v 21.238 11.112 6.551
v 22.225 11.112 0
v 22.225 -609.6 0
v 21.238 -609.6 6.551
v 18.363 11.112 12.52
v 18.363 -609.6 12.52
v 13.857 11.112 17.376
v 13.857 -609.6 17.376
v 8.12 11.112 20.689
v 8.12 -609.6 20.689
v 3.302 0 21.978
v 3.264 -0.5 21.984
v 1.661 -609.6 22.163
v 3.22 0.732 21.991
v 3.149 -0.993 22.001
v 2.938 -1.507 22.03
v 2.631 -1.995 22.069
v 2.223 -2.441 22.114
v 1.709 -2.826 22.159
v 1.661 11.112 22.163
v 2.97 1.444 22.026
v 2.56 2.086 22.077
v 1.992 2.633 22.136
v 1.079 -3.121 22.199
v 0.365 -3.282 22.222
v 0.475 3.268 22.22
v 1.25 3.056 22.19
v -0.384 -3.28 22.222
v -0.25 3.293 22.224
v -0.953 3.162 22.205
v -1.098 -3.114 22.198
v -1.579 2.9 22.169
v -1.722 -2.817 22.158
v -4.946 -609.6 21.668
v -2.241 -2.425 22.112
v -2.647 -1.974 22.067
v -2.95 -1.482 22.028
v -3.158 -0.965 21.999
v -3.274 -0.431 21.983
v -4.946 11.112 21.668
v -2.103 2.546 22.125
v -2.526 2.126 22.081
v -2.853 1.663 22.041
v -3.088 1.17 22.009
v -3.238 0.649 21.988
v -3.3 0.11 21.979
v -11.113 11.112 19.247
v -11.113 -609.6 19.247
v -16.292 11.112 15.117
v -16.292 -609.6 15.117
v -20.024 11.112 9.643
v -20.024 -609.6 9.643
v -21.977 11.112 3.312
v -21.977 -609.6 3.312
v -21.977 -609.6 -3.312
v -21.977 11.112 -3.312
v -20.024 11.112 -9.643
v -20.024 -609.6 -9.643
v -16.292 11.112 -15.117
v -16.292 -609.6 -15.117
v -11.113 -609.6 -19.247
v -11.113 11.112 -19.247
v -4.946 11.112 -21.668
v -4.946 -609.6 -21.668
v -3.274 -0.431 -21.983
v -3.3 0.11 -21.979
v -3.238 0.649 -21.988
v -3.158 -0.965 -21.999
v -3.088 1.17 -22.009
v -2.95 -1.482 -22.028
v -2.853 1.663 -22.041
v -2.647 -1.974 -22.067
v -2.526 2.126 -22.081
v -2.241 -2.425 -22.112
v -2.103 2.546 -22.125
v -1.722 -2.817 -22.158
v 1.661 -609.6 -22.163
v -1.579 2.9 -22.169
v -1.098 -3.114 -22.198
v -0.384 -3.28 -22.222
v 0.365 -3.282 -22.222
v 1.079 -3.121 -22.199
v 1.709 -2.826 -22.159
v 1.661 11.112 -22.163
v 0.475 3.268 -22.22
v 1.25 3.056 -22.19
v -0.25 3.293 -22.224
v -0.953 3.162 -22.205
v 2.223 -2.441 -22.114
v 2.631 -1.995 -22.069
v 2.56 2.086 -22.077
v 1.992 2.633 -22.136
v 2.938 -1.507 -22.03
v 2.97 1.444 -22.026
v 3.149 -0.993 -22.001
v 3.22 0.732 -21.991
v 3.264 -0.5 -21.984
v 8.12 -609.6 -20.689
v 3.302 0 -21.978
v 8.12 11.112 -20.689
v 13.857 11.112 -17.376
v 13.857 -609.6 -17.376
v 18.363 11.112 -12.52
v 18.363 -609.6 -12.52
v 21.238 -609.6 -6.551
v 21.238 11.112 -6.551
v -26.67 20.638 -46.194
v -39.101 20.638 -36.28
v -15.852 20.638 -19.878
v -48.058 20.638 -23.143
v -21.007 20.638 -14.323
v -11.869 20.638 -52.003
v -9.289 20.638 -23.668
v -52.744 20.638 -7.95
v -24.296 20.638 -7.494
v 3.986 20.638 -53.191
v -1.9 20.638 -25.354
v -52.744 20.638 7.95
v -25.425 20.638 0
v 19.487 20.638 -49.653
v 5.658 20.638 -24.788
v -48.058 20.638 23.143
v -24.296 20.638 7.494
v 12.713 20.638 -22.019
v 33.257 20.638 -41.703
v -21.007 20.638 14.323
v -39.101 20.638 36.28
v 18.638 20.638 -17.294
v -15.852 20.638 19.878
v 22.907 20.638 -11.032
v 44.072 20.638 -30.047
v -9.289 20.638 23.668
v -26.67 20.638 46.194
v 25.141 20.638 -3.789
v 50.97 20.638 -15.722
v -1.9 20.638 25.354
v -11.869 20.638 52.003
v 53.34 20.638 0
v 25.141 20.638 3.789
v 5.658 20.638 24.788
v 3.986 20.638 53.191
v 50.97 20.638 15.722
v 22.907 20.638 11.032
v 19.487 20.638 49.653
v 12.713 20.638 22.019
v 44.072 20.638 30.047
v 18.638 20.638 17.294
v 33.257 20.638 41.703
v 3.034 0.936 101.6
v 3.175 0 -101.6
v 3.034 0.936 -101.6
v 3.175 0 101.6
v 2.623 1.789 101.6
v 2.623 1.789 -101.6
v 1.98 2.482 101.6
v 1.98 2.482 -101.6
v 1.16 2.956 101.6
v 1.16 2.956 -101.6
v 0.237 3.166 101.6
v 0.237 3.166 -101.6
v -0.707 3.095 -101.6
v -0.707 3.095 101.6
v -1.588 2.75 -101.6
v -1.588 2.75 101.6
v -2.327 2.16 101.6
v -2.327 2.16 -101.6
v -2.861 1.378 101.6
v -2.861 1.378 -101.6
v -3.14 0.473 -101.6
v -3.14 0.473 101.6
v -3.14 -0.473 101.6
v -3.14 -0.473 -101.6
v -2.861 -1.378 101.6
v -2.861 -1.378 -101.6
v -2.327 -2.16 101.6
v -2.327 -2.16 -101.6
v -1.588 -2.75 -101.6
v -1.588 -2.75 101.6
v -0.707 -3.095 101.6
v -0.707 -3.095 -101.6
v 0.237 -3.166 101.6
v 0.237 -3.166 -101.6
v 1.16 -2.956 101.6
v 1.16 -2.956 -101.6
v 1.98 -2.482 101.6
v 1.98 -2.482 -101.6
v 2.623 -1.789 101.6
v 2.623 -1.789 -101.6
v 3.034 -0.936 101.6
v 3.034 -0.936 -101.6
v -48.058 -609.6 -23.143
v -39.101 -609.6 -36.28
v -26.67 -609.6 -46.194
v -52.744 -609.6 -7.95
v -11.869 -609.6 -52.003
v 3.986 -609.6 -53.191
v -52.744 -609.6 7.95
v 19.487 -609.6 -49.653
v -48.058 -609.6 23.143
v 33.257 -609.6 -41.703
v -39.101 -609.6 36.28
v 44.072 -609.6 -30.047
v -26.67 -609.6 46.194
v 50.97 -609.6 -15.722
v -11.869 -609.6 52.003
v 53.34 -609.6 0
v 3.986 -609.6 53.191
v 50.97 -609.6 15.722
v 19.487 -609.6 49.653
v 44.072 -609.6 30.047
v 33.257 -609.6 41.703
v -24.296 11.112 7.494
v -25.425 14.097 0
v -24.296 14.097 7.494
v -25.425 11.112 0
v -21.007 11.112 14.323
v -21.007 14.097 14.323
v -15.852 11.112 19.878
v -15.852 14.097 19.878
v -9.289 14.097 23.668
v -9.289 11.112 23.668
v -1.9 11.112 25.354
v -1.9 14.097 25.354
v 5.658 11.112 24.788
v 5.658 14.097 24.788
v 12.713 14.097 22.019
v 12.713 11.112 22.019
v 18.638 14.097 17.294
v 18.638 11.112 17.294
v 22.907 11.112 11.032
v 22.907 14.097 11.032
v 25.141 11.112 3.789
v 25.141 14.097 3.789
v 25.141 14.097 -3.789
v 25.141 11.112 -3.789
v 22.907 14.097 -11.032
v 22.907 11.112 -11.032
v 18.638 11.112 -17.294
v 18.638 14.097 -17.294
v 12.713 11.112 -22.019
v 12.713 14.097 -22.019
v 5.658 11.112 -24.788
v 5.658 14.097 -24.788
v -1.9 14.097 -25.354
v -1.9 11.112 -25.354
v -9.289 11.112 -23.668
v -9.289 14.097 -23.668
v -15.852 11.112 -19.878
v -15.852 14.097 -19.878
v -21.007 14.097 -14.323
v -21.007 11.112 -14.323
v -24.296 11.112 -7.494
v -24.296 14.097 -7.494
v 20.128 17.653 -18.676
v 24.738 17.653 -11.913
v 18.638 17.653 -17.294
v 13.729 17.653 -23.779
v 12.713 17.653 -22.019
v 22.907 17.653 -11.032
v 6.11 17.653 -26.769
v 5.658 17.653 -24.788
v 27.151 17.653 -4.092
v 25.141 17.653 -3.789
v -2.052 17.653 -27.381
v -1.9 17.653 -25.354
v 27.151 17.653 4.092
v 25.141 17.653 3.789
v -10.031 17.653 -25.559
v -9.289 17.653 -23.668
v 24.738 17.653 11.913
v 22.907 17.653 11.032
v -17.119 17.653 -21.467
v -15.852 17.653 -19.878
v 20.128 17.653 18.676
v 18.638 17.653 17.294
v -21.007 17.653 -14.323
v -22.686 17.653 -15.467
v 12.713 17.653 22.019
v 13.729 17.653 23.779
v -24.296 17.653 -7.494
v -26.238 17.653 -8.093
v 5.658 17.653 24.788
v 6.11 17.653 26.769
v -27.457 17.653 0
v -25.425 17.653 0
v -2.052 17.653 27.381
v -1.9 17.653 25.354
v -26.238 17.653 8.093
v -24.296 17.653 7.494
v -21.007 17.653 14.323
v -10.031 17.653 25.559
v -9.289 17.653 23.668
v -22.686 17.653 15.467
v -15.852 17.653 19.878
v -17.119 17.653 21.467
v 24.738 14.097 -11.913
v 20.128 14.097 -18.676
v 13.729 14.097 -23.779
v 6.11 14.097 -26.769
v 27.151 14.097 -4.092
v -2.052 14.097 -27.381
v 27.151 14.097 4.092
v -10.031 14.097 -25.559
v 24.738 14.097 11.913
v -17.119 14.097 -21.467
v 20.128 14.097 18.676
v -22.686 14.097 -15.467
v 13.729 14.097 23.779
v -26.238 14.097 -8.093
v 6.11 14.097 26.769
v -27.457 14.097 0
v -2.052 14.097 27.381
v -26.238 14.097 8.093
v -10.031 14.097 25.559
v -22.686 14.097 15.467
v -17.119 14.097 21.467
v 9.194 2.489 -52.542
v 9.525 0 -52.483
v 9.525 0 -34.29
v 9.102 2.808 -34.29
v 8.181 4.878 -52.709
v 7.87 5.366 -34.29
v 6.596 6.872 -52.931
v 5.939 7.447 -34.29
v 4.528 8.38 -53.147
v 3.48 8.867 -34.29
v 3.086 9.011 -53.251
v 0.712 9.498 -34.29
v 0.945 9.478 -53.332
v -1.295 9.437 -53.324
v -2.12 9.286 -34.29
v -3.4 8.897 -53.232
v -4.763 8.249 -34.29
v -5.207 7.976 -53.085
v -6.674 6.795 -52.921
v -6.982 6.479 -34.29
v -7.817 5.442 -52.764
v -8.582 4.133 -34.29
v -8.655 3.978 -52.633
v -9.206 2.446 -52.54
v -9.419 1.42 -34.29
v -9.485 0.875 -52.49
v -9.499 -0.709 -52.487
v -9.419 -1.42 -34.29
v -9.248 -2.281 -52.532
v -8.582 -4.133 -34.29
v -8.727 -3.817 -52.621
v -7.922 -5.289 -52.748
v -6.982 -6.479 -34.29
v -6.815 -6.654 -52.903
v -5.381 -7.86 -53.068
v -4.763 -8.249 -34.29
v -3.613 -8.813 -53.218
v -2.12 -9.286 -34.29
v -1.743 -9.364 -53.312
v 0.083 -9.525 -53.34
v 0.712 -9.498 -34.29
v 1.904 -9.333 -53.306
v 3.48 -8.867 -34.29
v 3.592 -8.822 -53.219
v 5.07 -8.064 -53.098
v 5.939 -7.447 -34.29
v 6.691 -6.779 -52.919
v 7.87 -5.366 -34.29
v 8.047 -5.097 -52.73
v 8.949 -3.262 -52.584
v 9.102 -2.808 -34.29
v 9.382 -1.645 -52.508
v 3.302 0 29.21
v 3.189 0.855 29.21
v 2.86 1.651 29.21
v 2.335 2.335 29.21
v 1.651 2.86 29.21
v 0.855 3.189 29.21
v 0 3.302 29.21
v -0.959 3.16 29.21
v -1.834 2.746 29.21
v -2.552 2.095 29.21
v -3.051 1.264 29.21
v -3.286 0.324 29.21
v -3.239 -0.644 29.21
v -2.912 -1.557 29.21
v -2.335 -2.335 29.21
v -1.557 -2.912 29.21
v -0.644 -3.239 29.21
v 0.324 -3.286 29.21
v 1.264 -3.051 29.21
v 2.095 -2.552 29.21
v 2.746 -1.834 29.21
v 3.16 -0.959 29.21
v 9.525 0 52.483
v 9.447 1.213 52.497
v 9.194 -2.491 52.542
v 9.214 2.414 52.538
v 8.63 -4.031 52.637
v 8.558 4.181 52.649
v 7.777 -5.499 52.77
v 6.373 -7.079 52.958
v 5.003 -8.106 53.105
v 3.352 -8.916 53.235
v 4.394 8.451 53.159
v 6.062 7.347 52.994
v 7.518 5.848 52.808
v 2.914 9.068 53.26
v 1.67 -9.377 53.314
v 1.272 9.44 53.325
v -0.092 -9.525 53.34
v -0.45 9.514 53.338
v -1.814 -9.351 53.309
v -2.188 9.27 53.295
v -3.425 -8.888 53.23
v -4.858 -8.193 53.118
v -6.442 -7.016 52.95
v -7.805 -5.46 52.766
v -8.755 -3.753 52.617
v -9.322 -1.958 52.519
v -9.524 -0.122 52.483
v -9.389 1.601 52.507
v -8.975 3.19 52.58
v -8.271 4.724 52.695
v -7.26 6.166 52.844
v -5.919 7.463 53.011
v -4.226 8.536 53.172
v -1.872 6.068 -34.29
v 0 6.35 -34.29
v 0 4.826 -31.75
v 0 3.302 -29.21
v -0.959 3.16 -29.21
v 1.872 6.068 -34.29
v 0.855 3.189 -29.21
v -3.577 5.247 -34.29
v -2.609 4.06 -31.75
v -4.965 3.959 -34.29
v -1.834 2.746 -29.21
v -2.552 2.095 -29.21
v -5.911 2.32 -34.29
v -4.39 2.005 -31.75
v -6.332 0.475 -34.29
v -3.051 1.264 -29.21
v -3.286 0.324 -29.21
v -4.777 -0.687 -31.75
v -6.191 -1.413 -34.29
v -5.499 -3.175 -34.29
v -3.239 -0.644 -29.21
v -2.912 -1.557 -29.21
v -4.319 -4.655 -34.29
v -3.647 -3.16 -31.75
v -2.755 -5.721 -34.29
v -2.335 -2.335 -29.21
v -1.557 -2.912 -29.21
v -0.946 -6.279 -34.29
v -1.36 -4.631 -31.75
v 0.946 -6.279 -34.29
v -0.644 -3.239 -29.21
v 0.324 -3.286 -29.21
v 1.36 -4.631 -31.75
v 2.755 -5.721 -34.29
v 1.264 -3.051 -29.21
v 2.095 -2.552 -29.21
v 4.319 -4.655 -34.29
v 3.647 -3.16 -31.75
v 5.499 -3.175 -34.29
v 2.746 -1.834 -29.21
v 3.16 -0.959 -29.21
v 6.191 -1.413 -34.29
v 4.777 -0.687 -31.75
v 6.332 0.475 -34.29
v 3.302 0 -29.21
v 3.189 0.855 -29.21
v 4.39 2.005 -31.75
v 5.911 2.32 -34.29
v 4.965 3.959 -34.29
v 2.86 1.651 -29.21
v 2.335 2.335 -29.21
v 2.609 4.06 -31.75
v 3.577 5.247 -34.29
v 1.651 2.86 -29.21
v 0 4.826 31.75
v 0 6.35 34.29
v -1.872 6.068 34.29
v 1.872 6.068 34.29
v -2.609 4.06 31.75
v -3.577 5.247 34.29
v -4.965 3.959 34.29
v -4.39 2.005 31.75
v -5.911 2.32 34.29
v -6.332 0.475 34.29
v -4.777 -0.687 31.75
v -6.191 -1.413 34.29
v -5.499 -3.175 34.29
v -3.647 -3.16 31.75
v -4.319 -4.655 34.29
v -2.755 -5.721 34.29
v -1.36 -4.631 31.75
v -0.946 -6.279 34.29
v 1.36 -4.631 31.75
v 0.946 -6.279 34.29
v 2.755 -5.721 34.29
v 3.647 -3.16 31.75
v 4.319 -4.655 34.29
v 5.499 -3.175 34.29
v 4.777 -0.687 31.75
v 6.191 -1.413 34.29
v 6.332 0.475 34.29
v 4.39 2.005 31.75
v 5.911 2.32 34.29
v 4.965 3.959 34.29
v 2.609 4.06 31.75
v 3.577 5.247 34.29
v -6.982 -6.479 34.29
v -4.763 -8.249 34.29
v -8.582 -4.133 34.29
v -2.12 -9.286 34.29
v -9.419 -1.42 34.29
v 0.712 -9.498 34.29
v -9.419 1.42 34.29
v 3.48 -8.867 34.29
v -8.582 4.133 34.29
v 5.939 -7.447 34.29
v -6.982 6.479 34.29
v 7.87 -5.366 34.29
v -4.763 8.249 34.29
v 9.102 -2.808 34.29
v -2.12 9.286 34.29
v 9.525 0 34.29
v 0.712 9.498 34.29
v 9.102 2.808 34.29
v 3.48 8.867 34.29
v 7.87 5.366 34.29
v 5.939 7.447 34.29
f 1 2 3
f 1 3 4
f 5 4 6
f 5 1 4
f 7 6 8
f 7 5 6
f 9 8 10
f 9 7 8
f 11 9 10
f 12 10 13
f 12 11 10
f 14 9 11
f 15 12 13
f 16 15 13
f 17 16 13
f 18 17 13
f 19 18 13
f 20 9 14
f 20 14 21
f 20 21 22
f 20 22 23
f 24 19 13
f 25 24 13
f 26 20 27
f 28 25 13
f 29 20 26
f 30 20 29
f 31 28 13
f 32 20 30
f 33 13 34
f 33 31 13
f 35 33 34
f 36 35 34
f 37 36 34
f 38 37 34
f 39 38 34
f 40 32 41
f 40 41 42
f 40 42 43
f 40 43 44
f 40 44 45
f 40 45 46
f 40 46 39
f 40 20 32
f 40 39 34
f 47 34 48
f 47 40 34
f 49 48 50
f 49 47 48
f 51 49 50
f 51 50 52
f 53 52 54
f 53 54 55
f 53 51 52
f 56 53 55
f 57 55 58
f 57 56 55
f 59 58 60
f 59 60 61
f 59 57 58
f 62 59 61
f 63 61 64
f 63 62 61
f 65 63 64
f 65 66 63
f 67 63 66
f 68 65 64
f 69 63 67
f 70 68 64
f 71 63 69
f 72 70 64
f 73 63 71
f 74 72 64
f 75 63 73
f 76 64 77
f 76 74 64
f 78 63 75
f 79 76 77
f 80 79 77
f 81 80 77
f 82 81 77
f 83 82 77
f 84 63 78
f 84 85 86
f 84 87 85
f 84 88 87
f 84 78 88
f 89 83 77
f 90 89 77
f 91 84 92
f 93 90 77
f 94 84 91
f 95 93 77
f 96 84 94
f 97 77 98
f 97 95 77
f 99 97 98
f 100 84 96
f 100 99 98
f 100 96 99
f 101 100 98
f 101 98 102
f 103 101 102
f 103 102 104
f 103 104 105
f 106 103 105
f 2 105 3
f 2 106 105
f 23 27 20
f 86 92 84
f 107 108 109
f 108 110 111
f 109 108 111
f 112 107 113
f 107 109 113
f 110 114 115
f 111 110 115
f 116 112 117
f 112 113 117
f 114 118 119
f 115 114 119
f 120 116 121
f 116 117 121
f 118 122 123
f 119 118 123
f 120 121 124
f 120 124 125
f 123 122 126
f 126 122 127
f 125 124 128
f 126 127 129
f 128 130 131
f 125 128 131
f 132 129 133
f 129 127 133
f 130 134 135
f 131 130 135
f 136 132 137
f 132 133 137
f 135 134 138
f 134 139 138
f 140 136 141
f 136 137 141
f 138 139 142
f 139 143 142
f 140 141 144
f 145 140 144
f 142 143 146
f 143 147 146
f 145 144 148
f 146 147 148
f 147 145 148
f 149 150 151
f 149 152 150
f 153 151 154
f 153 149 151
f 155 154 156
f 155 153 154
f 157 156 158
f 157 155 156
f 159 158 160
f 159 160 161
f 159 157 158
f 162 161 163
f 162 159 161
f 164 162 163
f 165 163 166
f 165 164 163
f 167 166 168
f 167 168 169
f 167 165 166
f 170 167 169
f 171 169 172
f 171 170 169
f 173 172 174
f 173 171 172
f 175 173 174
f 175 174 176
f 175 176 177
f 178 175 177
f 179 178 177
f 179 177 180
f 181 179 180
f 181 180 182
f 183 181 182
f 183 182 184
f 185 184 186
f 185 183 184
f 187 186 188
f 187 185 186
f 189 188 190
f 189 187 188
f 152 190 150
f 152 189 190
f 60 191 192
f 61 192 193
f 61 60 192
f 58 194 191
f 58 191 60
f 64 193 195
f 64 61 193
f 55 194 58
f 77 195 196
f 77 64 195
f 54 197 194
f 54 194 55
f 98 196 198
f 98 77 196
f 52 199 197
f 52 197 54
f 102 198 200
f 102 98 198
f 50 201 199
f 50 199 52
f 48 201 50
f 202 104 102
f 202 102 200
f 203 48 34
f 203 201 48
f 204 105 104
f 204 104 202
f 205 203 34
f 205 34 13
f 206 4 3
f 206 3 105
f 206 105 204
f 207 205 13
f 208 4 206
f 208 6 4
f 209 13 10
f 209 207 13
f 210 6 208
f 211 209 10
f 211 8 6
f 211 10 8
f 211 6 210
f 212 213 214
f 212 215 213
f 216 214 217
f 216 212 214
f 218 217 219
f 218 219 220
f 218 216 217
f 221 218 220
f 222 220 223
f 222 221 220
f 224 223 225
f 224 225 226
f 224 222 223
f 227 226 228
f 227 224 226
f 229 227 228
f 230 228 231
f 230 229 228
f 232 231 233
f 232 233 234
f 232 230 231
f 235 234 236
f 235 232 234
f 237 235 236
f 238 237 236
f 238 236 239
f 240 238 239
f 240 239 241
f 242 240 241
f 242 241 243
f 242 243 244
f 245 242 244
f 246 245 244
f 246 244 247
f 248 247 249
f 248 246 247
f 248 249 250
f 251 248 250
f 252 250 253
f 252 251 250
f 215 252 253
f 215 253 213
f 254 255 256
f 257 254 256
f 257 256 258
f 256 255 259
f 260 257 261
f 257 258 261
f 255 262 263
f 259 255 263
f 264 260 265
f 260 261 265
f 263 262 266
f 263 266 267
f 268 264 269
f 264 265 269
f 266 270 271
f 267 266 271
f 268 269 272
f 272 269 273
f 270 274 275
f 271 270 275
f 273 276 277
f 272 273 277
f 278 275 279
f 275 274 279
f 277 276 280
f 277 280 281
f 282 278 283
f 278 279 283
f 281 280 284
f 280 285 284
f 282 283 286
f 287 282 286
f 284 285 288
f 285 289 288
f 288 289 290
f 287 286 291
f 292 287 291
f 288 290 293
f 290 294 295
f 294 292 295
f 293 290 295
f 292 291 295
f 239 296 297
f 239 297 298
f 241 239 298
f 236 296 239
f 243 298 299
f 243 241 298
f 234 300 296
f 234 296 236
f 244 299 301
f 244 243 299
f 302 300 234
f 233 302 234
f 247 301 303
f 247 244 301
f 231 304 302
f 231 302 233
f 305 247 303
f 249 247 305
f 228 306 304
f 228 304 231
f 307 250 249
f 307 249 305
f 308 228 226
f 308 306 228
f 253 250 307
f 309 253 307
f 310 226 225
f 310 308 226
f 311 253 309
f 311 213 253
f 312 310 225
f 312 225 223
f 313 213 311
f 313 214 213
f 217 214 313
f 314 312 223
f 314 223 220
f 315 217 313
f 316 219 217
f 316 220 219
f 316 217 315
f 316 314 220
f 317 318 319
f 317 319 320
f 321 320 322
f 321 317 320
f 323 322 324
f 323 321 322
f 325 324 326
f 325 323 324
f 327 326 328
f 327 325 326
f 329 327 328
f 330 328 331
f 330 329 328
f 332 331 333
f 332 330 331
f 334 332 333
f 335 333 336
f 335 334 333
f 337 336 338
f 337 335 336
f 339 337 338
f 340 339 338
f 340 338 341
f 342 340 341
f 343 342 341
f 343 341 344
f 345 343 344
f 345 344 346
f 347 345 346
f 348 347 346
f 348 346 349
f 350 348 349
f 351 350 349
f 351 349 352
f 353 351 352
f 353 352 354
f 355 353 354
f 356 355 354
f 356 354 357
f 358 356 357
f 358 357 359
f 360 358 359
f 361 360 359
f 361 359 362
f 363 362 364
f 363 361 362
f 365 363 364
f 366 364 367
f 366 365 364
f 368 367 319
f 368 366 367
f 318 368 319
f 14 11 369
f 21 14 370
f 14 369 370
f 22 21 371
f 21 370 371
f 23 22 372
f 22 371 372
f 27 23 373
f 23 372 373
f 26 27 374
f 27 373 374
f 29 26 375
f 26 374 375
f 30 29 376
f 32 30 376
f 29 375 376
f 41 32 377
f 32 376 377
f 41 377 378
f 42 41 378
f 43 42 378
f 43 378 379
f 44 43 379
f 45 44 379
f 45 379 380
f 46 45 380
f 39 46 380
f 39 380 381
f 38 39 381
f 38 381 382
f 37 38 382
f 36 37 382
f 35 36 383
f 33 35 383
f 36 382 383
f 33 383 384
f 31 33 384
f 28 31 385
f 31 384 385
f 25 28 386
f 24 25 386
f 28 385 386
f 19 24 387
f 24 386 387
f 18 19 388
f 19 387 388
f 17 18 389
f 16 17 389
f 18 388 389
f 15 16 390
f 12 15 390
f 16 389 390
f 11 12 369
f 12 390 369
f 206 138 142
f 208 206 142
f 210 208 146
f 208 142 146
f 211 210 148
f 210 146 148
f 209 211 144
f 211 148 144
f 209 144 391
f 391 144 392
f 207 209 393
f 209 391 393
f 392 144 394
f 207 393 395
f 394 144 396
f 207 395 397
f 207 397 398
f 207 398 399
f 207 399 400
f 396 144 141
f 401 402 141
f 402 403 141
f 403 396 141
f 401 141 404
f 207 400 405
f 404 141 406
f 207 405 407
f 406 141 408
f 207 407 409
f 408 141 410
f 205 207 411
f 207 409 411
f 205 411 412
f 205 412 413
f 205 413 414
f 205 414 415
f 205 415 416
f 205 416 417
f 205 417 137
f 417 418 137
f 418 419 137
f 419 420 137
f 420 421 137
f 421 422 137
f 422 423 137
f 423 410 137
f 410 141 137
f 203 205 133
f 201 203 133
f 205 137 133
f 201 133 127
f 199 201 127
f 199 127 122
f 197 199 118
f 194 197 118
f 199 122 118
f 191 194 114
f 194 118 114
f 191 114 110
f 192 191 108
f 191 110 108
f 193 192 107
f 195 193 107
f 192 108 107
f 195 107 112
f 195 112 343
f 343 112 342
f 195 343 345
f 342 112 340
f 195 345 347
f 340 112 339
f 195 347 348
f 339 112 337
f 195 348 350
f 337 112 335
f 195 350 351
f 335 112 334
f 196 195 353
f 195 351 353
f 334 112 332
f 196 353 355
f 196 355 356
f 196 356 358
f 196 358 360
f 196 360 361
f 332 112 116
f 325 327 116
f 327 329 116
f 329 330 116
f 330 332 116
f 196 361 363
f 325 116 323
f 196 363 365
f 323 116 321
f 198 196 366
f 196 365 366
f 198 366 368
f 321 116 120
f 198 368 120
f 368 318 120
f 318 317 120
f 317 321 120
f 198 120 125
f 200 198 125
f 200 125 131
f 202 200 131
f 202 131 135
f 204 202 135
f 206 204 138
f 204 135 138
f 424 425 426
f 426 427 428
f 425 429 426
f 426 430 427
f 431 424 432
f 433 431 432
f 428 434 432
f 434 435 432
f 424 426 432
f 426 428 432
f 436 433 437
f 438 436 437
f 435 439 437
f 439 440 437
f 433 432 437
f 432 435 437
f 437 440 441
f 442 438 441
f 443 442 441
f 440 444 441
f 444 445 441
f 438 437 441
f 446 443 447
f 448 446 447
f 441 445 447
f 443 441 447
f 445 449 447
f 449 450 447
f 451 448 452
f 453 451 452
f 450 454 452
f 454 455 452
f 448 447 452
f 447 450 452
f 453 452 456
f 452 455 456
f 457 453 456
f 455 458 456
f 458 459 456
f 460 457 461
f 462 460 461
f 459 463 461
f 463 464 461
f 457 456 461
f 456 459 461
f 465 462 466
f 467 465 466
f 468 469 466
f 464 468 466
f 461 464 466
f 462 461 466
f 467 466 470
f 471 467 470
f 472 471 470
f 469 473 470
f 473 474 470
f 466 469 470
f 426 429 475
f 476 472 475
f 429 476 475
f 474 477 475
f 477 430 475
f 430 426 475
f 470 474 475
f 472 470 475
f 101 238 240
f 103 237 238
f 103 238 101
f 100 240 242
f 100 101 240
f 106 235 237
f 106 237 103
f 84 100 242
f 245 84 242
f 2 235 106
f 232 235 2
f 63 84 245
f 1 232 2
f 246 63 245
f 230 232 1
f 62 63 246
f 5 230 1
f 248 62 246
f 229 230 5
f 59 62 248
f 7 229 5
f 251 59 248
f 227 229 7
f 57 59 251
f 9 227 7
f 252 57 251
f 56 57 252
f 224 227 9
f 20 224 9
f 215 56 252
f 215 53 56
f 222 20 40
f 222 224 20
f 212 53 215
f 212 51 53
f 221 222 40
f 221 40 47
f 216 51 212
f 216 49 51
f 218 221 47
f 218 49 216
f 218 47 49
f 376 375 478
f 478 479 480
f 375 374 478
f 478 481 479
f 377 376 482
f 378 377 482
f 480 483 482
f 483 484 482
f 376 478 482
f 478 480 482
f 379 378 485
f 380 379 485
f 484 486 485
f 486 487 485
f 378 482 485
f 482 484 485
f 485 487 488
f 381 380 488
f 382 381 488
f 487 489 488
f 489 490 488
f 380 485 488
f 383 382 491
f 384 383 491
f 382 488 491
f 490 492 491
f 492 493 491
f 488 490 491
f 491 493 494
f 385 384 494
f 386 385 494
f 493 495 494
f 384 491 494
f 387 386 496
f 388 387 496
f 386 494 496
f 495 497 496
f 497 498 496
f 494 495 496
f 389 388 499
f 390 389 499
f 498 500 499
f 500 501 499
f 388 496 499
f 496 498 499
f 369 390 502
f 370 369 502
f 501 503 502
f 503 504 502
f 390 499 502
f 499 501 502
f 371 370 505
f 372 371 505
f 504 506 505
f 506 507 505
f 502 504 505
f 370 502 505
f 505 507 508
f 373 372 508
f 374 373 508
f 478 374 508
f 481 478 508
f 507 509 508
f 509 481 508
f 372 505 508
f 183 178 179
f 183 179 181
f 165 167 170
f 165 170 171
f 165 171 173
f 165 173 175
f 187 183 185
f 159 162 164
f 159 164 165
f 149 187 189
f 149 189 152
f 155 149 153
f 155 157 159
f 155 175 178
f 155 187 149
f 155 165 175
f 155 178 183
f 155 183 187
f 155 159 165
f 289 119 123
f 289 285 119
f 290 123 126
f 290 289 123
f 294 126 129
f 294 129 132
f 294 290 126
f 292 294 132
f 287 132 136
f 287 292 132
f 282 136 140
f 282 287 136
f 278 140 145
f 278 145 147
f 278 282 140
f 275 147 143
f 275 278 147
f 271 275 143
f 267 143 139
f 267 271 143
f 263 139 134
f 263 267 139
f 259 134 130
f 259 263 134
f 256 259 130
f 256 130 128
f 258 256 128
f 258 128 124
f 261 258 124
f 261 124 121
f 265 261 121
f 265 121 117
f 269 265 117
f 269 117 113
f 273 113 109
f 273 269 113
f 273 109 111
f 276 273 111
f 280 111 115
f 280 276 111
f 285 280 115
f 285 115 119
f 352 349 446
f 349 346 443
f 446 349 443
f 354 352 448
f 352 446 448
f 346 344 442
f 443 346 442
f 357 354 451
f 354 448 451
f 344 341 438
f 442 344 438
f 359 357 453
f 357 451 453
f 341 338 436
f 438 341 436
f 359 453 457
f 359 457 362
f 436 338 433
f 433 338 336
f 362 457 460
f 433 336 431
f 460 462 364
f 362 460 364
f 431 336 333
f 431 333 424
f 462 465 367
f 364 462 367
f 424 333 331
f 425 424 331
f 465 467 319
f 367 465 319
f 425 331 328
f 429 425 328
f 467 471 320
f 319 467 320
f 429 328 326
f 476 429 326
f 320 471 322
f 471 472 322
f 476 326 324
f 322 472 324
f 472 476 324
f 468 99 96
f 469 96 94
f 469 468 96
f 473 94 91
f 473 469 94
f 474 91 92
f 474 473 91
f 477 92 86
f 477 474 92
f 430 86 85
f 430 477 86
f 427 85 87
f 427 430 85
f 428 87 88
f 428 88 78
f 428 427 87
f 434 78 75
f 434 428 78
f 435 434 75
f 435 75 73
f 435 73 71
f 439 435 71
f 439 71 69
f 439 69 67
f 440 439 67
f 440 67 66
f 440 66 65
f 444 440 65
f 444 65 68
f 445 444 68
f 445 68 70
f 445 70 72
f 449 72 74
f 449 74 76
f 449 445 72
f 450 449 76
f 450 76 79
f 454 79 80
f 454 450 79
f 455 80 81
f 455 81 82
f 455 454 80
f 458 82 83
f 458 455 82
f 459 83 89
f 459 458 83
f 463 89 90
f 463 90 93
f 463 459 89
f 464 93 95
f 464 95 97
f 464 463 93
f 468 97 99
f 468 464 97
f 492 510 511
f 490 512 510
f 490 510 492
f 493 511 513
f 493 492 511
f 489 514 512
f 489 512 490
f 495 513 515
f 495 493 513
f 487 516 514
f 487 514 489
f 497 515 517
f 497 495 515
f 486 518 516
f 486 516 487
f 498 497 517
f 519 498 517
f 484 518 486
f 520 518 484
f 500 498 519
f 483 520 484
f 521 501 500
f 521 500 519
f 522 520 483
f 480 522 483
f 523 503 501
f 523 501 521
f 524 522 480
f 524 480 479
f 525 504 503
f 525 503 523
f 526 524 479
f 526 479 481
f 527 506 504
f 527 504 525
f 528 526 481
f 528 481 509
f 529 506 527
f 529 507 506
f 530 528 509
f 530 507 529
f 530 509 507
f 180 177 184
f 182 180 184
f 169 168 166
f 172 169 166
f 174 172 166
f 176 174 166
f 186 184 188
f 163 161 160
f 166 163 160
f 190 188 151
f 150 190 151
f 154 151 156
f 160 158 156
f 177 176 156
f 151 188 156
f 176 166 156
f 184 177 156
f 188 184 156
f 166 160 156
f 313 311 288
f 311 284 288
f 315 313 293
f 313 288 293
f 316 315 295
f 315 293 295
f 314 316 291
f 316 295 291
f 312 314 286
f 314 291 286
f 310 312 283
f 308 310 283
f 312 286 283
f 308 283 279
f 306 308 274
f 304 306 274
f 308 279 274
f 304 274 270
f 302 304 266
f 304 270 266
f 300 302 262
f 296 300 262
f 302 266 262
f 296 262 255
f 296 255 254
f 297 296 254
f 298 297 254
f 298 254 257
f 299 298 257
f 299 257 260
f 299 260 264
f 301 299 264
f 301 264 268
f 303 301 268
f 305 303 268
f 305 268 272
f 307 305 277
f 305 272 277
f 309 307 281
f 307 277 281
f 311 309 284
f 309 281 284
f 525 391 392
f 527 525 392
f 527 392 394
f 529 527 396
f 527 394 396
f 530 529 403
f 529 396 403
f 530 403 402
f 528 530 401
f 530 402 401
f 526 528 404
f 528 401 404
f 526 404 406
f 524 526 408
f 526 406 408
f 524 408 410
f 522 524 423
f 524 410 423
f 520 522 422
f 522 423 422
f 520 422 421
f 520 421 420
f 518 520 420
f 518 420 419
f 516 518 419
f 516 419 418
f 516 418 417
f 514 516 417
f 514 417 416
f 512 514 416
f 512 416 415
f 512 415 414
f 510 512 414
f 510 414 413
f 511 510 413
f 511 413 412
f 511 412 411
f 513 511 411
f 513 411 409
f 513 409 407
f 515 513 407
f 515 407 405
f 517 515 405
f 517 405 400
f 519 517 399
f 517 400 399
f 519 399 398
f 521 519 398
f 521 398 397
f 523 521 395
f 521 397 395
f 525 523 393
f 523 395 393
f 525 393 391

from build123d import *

# Parameters (mm, degrees)
F0_R      = 53.34
F0_R_2    = 22.225
F1_DEPTH  = 20.6375
F6_DEPTH  = 609.6
F5_R      = 9.525
F5_R_2    = 3.302
F7_DEPTH  = 19.05
F8_DEPTH  = 32.3616602869
F4_R      = 9.525
F4_R_2    = 3.302
F9_DEPTH  = 19.05
F10_DEPTH = 32.3616602869
F13_W     = 2.032
F13_H     = 3.556
F15_R     = 3.175
F16_DEPTH = 101.6


# Not quite as in the source:
# - the program builds the solid bodies; features that only make, move or delete a surface that nothing else refers to are left out


with BuildPart() as f1:
    # F0 (on Front) → F1 (new body)
    with BuildSketch(Plane.XZ):
        Circle(F0_R)
        Circle(F0_R_2, mode=Mode.SUBTRACT)
    extrude(amount=-F1_DEPTH)

    # F0 (on Front) → F6 (join)
    with BuildSketch(Plane.XZ):
        Circle(F0_R)
        Circle(F0_R_2, mode=Mode.SUBTRACT)
    extrude(amount=F6_DEPTH)

    # F5 (on offset) → F7 (cut)
    with BuildSketch(Plane.XY.offset(-53.34)):
        Circle(F5_R)
        Circle(F5_R_2, mode=Mode.SUBTRACT)
        Circle(F5_R_2)
    extrude(amount=F7_DEPTH, mode=Mode.SUBTRACT)

    # F5 (on offset) → F8 (cut, up to face)
    with BuildSketch(Plane.XY.offset(-53.34)):
        Circle(F5_R_2)
    extrude(amount=F8_DEPTH, mode=Mode.SUBTRACT)

    # F4 (on offset) → F9 (cut)
    with BuildSketch(Plane.XY.offset(53.34)):
        Circle(F4_R)
        Circle(F4_R_2, mode=Mode.SUBTRACT)
        Circle(F4_R_2)
    extrude(amount=-F9_DEPTH, mode=Mode.SUBTRACT)

    # F4 (on offset) → F10 (cut, up to face)
    with BuildSketch(Plane.XY.offset(53.34)):
        Circle(F4_R_2)
    extrude(amount=-F10_DEPTH, mode=Mode.SUBTRACT)

    # F11 (on Right) → F12 (revolve, cut)
    with BuildSketch(Plane.YZ):
        Polygon((6.35, 34.29), (3.302, 34.29), (3.302, 29.21), align=None)
        Polygon((3.302, -29.21), (3.302, -34.29), (6.35, -34.29), align=None)
    revolve(axis=Axis((0, 0, 6.9711627439), (0, 0, 1)), mode=Mode.SUBTRACT)

    # F13 (on Top) → F14 (revolve, cut)
    with BuildSketch(Plane.XY):
        Polygon((-25.4254, 11.1125), (-22.225, 11.1125), (-22.225, 20.6375), (-25.4254, 20.6375), (-25.4254, 17.653), (-25.4254, 14.097), align=None)
        with Locations((-26.4414, 15.875)):
            Rectangle(F13_W, F13_H)
    revolve(axis=Axis((0, 5.55625, 0), (0, 1, 0)), mode=Mode.SUBTRACT)


with BuildPart() as f16:
    # F15 (on Top) → F16 (new body, symmetric)
    with BuildSketch(Plane.XY):
        Circle(F15_R)
    extrude(amount=F16_DEPTH, both=True)


solid = Compound([f1.part, f16.part])
